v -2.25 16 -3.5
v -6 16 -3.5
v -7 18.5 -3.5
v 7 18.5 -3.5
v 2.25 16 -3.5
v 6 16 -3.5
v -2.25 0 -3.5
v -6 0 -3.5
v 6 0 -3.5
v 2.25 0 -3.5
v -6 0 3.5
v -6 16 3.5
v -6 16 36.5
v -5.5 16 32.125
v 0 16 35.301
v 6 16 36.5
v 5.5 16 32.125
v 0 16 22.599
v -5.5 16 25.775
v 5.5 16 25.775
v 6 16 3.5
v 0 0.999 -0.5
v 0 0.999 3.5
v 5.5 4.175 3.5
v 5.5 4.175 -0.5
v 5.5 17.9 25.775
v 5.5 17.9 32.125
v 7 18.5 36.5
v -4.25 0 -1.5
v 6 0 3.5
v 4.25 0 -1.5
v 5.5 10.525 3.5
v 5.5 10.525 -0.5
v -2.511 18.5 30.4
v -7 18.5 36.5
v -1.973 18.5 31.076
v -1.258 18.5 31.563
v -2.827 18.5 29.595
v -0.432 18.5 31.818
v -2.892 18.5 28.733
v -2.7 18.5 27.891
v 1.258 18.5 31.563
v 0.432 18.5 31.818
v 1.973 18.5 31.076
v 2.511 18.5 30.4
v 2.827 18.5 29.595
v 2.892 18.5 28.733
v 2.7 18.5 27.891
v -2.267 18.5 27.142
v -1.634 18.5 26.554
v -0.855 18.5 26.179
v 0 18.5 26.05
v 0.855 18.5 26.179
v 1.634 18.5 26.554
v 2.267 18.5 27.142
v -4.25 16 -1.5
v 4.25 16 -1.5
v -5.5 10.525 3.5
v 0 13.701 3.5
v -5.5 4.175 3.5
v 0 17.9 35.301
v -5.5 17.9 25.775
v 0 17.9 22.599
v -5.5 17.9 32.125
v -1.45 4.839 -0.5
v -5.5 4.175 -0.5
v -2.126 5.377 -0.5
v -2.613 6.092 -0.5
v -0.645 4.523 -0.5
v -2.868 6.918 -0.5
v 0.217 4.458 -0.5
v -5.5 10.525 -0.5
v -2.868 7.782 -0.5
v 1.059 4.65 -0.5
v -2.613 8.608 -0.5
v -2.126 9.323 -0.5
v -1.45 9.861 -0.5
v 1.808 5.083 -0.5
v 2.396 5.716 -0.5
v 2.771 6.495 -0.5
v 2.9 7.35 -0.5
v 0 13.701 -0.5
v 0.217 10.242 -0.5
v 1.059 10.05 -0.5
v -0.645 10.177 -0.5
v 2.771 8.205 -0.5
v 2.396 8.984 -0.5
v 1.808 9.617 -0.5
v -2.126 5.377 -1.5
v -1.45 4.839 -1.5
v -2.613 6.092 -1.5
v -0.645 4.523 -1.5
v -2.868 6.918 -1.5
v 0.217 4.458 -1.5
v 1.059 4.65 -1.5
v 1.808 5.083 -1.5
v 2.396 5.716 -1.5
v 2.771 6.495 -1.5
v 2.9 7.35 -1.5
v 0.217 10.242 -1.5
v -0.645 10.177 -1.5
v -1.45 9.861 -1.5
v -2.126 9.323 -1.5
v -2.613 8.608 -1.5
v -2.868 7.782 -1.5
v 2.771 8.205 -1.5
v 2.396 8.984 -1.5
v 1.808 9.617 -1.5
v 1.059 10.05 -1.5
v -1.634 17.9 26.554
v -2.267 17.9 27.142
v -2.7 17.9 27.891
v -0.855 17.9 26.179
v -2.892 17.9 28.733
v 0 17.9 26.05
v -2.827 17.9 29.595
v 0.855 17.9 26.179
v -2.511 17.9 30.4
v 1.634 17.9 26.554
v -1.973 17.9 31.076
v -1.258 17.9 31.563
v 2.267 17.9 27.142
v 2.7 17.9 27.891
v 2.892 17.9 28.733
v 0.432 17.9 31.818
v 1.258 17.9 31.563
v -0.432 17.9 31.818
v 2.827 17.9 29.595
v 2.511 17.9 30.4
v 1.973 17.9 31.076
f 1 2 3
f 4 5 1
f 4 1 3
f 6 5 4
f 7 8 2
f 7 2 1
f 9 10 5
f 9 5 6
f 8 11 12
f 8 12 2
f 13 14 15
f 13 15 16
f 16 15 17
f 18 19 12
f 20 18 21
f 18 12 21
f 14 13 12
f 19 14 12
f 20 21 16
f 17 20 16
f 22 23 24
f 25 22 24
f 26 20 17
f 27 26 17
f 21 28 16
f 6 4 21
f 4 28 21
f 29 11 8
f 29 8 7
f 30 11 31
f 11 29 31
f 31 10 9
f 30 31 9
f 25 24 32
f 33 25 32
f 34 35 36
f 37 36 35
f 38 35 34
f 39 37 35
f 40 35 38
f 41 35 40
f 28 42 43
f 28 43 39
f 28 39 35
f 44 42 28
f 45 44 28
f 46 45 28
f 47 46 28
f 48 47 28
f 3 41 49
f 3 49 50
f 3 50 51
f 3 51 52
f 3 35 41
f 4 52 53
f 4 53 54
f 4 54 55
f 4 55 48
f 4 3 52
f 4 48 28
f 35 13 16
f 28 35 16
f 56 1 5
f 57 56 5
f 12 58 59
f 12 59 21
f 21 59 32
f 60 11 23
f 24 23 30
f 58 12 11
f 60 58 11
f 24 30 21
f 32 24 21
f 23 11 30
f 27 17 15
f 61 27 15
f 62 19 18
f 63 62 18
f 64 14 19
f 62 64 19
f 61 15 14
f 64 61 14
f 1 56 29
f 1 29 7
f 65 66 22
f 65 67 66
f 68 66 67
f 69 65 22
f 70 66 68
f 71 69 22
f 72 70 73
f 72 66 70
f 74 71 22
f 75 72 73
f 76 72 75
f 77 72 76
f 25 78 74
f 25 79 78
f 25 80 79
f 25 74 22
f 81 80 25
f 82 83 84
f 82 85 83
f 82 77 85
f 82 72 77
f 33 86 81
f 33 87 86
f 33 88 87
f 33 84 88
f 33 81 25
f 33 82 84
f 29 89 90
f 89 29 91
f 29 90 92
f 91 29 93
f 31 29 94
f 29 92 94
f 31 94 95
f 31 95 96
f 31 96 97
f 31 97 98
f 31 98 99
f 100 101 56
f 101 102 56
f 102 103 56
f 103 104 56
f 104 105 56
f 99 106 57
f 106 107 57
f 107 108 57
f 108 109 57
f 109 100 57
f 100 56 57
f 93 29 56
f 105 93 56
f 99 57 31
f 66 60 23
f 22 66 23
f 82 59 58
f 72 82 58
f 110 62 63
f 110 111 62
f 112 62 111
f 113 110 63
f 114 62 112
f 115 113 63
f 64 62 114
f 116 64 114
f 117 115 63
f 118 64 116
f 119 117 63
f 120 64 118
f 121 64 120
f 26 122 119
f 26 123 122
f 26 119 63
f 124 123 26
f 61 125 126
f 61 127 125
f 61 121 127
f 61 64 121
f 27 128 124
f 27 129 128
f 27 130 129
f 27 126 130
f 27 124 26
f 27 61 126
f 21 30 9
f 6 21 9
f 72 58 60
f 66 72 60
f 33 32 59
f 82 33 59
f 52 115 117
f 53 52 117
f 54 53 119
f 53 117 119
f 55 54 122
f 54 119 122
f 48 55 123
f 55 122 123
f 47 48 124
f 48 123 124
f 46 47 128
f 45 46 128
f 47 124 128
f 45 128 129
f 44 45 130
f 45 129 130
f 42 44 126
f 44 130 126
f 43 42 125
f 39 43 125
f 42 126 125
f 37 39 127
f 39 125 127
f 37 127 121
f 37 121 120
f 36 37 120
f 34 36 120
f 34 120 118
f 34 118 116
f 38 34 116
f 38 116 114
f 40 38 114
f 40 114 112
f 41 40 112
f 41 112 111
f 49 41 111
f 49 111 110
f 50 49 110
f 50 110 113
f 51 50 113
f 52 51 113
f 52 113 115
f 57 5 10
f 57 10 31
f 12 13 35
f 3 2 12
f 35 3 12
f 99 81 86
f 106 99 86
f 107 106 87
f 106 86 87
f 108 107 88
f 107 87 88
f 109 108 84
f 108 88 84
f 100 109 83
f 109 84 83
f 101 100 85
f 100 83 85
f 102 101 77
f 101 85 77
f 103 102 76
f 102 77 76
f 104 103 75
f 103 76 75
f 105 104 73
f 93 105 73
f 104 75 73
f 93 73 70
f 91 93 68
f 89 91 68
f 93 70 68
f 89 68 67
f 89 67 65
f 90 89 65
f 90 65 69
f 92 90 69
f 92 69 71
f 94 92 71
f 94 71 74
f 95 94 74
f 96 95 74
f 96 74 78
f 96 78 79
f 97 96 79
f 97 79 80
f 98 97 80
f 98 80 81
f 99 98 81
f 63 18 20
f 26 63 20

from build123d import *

# Parameters (mm, degrees)
SKETCH1_W           = 12
SKETCH1_H           = 7
BOSS_EXTRUDE1_DEPTH = 16
CUT_EXTRUDE1_DEPTH  = 20
CUT_EXTRUDE2_REACH  = 20.466
SKETCH3_R           = 2.9
CUT_EXTRUDE3_DEPTH  = 4
SKETCH5_W           = 14
SKETCH5_H           = 40
BOSS_EXTRUDE2_DEPTH = 2.5
CUT_EXTRUDE4_REACH  = 46.623
CUT_EXTRUDE6_DEPTH  = 1.9
CUT_EXTRUDE7_REACH  = 43.251
SKETCH9_R           = 2.9


with BuildPart() as part:
    # Sketch1 → Boss-Extrude1 (new body)
    with BuildSketch(Plane(origin=(0, 0, 0), x_dir=(1, 0, 0), z_dir=(0, 1, 0))):
        Rectangle(SKETCH1_W, SKETCH1_H)
    extrude(amount=BOSS_EXTRUDE1_DEPTH)

    # Sketch2 → Cut-Extrude1 (cut)
    with BuildSketch(Plane(origin=(0, 16, 0), x_dir=(1, 0, 0), z_dir=(0, 1, 0))):
        Polygon((0, 3.5), (2.25, 3.5), (4.25, 1.5), (0, 1.5), (-4.25, 1.5), (-2.25, 3.5), align=None)
    extrude(amount=-CUT_EXTRUDE1_DEPTH, mode=Mode.SUBTRACT)

    # Sketch3 → Cut-Extrude2 (cut, up to next)
    with BuildSketch(Plane.XY.offset(3.5), mode=Mode.PRIVATE) as cut_extrude2_sk1:
        with Locations((0, 7.35)):
            Circle(SKETCH3_R)
    cut_extrude2_tool1 = extrude(cut_extrude2_sk1.sketch, amount=-CUT_EXTRUDE2_REACH, mode=Mode.PRIVATE) & part.part
    add(cut_extrude2_tool1.solids().sort_by_distance((0, 7.35, 3.5))[0], mode=Mode.SUBTRACT)

    # Sketch4 → Cut-Extrude3 (cut)
    with BuildSketch(Plane.XY.offset(3.5)):
        Polygon((0, 13.700852961), (-5.5, 10.525426481), (-5.5, 4.174573519), (0, 0.999147039), (5.5, 4.174573519), (5.5, 10.525426481), align=None)
    extrude(amount=-CUT_EXTRUDE3_DEPTH, mode=Mode.SUBTRACT)

    # Sketch5 → Boss-Extrude2 (add)
    with BuildSketch(Plane(origin=(0, 16, 0), x_dir=(1, 0, 0), z_dir=(0, 1, 0))):
        with Locations((0, -16.5)):
            Rectangle(SKETCH5_W, SKETCH5_H)
    extrude(amount=BOSS_EXTRUDE2_DEPTH)

    # Sketch6 → Cut-Extrude4 (cut, up to next)
    with BuildSketch(Plane(origin=(0, 0, -3.5), x_dir=(-1, 0, 0), z_dir=(0, 0, -1)), mode=Mode.PRIVATE) as cut_extrude4_sk1:
        Polygon((-7, 16), (-7, 18.5), (-6, 16), align=None)
    cut_extrude4_tool1 = extrude(cut_extrude4_sk1.sketch, amount=-CUT_EXTRUDE4_REACH, mode=Mode.PRIVATE) & part.part
    # Sketch6 → Cut-Extrude4 (cut, up to next)
    with BuildSketch(Plane(origin=(0, 0, -3.5), x_dir=(-1, 0, 0), z_dir=(0, 0, -1)), mode=Mode.PRIVATE) as cut_extrude4_sk2:
        Polygon((7, 16), (6, 16), (7, 18.5), align=None)
    cut_extrude4_tool2 = extrude(cut_extrude4_sk2.sketch, amount=-CUT_EXTRUDE4_REACH, mode=Mode.PRIVATE) & part.part
    add(cut_extrude4_tool1.solids().sort_by_distance((6.666667, 16.833333, -3.5))[0], mode=Mode.SUBTRACT)
    add(cut_extrude4_tool2.solids().sort_by_distance((-6.666667, 16.833333, -3.5))[0], mode=Mode.SUBTRACT)

    # Sketch8 → Cut-Extrude6 (cut)
    with BuildSketch(Plane.XZ.offset(-16)):
        Polygon((0, 22.599147039), (5.5, 25.774573519), (5.5, 32.125426481), (0, 35.300852961), (-5.5, 32.125426481), (-5.5, 25.774573519), align=None)
    extrude(amount=-CUT_EXTRUDE6_DEPTH, mode=Mode.SUBTRACT)

    # Sketch9 → Cut-Extrude7 (cut, up to next)
    with BuildSketch(Plane(origin=(0, 17.9, 0), x_dir=(-1, 0, 0), z_dir=(0, -1, 0)), mode=Mode.PRIVATE) as cut_extrude7_sk1:
        with Locations(Location((0, -28.95, 0), (0, 0, 90))):
            Circle(SKETCH9_R)
    cut_extrude7_tool1 = extrude(cut_extrude7_sk1.sketch, amount=-CUT_EXTRUDE7_REACH, mode=Mode.PRIVATE) & part.part
    add(cut_extrude7_tool1.solids().sort_by_distance((0, 17.9, 28.95))[0], mode=Mode.SUBTRACT)


solid = part.part
